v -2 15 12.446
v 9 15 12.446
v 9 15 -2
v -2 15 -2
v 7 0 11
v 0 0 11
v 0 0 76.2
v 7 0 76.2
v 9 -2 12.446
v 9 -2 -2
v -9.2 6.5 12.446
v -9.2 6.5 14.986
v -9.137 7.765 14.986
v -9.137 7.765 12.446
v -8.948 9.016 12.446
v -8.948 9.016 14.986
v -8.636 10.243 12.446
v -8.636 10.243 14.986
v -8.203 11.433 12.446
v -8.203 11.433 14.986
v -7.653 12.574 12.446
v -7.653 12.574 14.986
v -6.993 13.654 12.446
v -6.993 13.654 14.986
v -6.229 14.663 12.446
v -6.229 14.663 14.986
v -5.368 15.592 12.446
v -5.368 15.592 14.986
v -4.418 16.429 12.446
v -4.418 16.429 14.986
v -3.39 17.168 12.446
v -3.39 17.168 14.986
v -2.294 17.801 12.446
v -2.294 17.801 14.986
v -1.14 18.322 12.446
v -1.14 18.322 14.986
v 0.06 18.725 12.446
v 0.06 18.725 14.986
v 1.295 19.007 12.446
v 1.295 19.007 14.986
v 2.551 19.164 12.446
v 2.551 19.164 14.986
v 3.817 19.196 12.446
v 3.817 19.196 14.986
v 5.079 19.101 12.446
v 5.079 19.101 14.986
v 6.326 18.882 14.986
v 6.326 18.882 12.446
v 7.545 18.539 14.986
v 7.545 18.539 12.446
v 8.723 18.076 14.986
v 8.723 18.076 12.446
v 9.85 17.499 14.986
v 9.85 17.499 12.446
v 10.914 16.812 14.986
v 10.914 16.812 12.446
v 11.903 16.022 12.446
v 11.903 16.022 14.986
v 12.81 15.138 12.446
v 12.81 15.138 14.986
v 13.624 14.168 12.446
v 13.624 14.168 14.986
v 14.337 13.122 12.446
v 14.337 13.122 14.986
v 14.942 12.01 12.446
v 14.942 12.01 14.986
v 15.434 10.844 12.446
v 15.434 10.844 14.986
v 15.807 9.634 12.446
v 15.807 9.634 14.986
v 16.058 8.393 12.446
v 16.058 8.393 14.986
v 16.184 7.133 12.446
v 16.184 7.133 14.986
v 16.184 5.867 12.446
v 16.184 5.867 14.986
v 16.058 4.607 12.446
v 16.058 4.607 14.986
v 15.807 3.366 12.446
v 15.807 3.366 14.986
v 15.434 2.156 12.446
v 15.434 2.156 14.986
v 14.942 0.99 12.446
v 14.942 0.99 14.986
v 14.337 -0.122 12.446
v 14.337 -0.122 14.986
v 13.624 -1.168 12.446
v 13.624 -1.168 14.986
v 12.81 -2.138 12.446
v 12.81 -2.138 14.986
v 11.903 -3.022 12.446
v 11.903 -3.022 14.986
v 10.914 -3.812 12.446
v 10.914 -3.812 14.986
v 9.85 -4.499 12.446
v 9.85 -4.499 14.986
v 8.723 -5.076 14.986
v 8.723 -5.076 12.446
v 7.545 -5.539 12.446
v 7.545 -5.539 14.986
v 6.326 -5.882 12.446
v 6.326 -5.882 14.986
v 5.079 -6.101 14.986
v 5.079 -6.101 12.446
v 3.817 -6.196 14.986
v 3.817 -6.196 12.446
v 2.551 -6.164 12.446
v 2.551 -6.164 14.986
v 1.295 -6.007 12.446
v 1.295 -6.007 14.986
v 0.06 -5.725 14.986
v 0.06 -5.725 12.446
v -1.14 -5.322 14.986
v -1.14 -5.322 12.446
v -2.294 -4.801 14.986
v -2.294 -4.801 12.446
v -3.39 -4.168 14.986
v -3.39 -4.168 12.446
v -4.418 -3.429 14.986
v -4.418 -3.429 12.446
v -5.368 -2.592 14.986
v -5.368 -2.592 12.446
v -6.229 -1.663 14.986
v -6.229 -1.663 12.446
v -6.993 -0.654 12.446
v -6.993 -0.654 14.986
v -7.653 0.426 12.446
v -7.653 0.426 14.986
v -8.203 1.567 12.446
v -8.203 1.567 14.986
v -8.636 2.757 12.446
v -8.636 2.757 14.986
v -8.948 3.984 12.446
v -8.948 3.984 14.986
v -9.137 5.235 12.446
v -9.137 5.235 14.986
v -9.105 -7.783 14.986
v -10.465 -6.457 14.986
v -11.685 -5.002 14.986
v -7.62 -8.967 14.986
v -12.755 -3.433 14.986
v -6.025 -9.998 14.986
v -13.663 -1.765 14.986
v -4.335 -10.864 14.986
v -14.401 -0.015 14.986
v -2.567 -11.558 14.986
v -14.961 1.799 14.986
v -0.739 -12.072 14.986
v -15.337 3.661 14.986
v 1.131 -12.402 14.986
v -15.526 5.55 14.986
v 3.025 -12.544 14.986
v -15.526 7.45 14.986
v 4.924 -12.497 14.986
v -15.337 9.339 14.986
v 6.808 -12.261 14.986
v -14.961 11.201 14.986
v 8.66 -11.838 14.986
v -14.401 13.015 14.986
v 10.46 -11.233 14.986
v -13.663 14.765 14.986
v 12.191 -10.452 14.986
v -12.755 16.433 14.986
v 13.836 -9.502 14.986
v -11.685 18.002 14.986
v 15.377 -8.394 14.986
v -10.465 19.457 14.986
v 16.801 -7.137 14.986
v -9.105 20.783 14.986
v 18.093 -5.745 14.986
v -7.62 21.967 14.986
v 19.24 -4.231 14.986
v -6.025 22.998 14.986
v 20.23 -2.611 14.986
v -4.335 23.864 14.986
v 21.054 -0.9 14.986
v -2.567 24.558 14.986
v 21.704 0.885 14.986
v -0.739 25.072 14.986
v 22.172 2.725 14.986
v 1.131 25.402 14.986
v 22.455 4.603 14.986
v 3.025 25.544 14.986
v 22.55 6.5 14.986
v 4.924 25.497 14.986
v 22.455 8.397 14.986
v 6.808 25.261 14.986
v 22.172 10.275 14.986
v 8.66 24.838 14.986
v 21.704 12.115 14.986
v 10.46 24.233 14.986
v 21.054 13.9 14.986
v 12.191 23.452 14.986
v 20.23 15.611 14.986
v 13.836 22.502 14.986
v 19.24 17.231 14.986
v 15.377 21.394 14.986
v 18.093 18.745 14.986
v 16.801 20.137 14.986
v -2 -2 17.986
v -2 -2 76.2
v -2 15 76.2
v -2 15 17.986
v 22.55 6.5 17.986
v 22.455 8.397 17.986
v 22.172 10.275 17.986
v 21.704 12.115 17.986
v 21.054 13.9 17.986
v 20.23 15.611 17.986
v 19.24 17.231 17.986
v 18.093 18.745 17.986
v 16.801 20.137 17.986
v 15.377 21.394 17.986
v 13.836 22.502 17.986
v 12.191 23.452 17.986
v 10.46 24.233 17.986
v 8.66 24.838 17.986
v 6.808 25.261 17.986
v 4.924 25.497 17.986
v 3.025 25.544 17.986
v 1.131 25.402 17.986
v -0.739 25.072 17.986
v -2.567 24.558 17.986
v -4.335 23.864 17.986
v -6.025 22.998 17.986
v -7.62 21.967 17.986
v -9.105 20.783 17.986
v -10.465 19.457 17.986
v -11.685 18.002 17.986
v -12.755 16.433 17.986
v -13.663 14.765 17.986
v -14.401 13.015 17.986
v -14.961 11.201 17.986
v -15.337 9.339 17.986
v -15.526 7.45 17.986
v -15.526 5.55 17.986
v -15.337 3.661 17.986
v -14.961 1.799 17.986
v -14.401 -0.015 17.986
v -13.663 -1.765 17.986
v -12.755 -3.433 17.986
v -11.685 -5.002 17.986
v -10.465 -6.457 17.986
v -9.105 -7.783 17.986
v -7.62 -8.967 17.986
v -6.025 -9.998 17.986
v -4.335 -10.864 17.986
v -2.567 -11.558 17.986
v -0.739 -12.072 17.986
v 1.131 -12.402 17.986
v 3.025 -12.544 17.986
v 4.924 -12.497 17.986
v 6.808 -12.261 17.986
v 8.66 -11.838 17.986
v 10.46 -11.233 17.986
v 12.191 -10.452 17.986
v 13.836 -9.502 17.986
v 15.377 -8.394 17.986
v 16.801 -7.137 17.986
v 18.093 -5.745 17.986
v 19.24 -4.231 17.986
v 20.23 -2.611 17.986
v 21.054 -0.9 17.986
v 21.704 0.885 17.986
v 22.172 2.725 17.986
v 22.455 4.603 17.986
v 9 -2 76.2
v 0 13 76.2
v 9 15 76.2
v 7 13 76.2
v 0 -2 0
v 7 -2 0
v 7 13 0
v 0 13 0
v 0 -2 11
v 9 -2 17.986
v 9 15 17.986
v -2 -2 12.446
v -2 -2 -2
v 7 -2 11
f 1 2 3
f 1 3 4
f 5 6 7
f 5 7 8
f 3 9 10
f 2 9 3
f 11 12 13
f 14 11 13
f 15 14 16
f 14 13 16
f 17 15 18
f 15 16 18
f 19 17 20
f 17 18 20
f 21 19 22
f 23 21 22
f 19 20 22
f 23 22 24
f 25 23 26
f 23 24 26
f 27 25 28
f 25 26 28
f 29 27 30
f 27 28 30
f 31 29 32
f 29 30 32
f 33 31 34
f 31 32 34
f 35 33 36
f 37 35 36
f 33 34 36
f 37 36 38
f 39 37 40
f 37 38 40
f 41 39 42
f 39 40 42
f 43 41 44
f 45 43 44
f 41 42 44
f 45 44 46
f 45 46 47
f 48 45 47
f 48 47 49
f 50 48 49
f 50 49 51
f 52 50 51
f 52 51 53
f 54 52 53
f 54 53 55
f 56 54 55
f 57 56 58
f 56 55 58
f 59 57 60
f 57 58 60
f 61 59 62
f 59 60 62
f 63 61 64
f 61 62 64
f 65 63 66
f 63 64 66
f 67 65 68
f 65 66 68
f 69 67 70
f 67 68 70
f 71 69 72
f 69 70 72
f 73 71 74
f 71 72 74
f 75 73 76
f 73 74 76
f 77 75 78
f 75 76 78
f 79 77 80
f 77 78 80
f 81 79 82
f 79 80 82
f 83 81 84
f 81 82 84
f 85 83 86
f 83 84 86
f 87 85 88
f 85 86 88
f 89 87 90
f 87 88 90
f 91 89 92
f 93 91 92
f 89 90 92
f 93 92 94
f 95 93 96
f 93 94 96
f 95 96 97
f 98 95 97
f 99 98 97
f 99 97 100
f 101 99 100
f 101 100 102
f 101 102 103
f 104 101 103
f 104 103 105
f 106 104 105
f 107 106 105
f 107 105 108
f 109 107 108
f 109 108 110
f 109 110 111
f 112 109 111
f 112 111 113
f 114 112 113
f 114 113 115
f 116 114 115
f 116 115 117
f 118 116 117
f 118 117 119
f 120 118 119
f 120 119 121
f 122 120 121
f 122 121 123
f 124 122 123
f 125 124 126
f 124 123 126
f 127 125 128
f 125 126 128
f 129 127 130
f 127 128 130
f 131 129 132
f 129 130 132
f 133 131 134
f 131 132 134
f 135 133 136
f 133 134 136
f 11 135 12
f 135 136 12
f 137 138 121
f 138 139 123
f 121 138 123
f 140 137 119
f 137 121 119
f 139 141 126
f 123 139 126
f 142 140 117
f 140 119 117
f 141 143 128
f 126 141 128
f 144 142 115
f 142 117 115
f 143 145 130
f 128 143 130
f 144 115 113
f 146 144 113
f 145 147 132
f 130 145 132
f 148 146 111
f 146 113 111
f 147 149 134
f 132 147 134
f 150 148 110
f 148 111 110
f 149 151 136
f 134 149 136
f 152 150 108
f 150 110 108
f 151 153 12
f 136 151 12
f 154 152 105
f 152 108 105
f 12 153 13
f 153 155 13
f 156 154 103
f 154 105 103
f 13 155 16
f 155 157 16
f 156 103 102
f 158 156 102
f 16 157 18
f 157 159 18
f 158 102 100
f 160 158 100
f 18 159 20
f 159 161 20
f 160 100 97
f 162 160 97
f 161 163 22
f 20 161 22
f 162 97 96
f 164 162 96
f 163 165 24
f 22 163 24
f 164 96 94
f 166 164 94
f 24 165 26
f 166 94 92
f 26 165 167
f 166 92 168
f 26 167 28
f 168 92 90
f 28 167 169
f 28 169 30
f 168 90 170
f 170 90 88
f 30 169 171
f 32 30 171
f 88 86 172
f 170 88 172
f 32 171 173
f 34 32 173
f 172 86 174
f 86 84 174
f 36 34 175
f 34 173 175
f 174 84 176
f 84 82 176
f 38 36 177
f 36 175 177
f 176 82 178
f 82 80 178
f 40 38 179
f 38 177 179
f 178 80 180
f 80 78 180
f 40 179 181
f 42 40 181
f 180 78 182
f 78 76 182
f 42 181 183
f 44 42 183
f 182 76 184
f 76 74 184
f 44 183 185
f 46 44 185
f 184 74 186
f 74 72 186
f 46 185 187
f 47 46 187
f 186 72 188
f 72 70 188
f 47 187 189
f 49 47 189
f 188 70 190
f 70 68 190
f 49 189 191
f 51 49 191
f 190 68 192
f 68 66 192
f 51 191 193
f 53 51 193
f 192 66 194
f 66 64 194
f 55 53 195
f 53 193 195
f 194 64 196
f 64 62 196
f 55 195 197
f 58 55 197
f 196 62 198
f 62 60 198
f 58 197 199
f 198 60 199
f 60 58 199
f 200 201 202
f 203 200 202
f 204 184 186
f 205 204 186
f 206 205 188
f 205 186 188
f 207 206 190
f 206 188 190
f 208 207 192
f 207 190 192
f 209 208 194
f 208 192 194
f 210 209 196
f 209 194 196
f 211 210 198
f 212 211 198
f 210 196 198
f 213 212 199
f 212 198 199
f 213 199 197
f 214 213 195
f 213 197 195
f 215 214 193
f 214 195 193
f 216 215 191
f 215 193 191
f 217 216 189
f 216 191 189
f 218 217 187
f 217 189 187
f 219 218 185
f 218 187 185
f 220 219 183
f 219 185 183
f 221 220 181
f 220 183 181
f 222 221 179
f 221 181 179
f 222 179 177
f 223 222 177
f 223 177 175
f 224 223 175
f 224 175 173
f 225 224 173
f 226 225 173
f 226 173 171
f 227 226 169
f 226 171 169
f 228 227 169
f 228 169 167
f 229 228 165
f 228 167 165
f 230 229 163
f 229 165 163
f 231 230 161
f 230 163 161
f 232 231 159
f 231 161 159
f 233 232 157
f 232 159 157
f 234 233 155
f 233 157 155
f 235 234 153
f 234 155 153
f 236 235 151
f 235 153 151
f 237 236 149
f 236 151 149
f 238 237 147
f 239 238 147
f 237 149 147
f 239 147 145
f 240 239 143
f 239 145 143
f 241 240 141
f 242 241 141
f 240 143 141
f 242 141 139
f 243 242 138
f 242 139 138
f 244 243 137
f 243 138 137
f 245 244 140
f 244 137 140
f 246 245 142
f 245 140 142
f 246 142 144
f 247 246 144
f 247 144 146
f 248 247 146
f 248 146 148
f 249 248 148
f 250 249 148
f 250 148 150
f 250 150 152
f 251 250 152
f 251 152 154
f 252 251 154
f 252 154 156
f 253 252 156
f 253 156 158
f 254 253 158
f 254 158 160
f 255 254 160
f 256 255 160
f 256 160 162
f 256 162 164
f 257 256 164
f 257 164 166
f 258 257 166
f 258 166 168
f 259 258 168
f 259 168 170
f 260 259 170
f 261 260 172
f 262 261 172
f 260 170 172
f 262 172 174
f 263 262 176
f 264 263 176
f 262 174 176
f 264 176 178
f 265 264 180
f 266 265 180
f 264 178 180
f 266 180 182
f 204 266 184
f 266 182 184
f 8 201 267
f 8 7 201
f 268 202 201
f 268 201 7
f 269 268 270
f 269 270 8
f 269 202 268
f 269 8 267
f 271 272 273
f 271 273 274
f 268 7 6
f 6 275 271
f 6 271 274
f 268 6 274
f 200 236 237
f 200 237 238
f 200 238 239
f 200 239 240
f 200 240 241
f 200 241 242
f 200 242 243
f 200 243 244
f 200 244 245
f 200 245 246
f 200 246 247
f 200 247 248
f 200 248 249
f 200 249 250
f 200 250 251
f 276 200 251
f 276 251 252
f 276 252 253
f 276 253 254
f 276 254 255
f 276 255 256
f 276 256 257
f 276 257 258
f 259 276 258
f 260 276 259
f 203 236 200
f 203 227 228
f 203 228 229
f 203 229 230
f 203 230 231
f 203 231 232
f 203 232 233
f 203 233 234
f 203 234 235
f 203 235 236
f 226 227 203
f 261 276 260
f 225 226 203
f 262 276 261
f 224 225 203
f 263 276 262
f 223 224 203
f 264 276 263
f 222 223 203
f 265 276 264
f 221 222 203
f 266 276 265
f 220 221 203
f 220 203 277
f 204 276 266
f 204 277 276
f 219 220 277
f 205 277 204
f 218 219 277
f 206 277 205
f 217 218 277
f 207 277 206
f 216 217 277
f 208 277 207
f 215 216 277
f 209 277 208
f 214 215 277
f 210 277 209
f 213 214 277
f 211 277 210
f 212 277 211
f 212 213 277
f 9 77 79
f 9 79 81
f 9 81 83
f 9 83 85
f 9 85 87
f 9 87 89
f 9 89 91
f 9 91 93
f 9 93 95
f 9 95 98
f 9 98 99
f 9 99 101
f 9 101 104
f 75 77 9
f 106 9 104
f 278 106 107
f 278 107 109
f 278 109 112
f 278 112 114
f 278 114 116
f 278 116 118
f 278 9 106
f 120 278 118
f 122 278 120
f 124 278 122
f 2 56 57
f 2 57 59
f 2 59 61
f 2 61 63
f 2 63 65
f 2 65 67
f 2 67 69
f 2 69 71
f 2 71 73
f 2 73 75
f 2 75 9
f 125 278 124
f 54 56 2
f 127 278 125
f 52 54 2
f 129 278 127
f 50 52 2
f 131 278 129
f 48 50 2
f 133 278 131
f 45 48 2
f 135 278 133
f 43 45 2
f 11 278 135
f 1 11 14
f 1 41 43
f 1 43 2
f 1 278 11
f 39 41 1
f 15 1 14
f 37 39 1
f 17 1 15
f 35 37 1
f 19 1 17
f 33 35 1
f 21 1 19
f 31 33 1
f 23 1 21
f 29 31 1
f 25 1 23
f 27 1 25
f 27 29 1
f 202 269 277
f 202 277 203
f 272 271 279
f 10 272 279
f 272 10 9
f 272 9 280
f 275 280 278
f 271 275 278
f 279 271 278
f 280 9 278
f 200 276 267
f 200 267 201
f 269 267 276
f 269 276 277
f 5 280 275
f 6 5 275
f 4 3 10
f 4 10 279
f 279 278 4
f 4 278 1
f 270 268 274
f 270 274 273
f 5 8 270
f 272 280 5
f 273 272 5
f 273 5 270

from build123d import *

# Parameters (mm, degrees)
SKETCH1_W           = 11
SKETCH1_H           = 17
SKETCH1_W_2         = 7
SKETCH1_H_2         = 13
BOSS_EXTRUDE1_DEPTH = 76.2
SKETCH2_W           = 11
SKETCH2_H           = 17
BOSS_EXTRUDE2_DEPTH = 2
SKETCH3_W           = 7
SKETCH3_H           = 11
CUT_EXTRUDE1_DEPTH  = 2
SKETCH4_R           = 19.05
SKETCH4_W           = 11
SKETCH4_H           = 17
BOSS_EXTRUDE3_DEPTH = 3
SKETCH5_R           = 12.7
SKETCH5_W           = 11
SKETCH5_H           = 17
BOSS_EXTRUDE4_DEPTH = 2.54


with BuildPart() as part:
    # Sketch1 → Boss-Extrude1 (new body)
    with BuildSketch(Plane.XY):
        with Locations((3.5, 6.5)):
            Rectangle(SKETCH1_W, SKETCH1_H)
        with Locations((3.5, 6.5)):
            Rectangle(SKETCH1_W_2, SKETCH1_H_2, mode=Mode.SUBTRACT)
    extrude(amount=BOSS_EXTRUDE1_DEPTH)

    # Sketch2 → Boss-Extrude2 (add)
    with BuildSketch(Plane(origin=(0, 0, 0), x_dir=(-1, 0, 0), z_dir=(0, 0, -1))):
        with Locations((-3.5, 6.5)):
            Rectangle(SKETCH2_W, SKETCH2_H)
    extrude(amount=BOSS_EXTRUDE2_DEPTH)

    # Sketch3 → Cut-Extrude1 (cut)
    with BuildSketch(Plane(origin=(0, -2, 0), x_dir=(-1, 0, 0), z_dir=(0, -1, 0))):
        with Locations((-3.5, -5.5)):
            Rectangle(SKETCH3_W, SKETCH3_H)
    extrude(amount=-CUT_EXTRUDE1_DEPTH, mode=Mode.SUBTRACT)

    # Sketch4 → Boss-Extrude3 (add)
    with BuildSketch(Plane.XY.offset(14.986)):
        with Locations((3.5, 6.5)):
            Circle(SKETCH4_R)
        with Locations((3.5, 6.5)):
            Rectangle(SKETCH4_W, SKETCH4_H, mode=Mode.SUBTRACT)
    extrude(amount=BOSS_EXTRUDE3_DEPTH)

    # Sketch5 → Boss-Extrude4 (add)
    with BuildSketch(Plane(origin=(0, 0, 14.986), x_dir=(-1, 0, 0), z_dir=(0, 0, -1))):
        with Locations((-3.5, 6.5)):
            Circle(SKETCH5_R)
        with Locations((-3.5, 6.5)):
            Rectangle(SKETCH5_W, SKETCH5_H, mode=Mode.SUBTRACT)
    extrude(amount=BOSS_EXTRUDE4_DEPTH)


solid = part.part
